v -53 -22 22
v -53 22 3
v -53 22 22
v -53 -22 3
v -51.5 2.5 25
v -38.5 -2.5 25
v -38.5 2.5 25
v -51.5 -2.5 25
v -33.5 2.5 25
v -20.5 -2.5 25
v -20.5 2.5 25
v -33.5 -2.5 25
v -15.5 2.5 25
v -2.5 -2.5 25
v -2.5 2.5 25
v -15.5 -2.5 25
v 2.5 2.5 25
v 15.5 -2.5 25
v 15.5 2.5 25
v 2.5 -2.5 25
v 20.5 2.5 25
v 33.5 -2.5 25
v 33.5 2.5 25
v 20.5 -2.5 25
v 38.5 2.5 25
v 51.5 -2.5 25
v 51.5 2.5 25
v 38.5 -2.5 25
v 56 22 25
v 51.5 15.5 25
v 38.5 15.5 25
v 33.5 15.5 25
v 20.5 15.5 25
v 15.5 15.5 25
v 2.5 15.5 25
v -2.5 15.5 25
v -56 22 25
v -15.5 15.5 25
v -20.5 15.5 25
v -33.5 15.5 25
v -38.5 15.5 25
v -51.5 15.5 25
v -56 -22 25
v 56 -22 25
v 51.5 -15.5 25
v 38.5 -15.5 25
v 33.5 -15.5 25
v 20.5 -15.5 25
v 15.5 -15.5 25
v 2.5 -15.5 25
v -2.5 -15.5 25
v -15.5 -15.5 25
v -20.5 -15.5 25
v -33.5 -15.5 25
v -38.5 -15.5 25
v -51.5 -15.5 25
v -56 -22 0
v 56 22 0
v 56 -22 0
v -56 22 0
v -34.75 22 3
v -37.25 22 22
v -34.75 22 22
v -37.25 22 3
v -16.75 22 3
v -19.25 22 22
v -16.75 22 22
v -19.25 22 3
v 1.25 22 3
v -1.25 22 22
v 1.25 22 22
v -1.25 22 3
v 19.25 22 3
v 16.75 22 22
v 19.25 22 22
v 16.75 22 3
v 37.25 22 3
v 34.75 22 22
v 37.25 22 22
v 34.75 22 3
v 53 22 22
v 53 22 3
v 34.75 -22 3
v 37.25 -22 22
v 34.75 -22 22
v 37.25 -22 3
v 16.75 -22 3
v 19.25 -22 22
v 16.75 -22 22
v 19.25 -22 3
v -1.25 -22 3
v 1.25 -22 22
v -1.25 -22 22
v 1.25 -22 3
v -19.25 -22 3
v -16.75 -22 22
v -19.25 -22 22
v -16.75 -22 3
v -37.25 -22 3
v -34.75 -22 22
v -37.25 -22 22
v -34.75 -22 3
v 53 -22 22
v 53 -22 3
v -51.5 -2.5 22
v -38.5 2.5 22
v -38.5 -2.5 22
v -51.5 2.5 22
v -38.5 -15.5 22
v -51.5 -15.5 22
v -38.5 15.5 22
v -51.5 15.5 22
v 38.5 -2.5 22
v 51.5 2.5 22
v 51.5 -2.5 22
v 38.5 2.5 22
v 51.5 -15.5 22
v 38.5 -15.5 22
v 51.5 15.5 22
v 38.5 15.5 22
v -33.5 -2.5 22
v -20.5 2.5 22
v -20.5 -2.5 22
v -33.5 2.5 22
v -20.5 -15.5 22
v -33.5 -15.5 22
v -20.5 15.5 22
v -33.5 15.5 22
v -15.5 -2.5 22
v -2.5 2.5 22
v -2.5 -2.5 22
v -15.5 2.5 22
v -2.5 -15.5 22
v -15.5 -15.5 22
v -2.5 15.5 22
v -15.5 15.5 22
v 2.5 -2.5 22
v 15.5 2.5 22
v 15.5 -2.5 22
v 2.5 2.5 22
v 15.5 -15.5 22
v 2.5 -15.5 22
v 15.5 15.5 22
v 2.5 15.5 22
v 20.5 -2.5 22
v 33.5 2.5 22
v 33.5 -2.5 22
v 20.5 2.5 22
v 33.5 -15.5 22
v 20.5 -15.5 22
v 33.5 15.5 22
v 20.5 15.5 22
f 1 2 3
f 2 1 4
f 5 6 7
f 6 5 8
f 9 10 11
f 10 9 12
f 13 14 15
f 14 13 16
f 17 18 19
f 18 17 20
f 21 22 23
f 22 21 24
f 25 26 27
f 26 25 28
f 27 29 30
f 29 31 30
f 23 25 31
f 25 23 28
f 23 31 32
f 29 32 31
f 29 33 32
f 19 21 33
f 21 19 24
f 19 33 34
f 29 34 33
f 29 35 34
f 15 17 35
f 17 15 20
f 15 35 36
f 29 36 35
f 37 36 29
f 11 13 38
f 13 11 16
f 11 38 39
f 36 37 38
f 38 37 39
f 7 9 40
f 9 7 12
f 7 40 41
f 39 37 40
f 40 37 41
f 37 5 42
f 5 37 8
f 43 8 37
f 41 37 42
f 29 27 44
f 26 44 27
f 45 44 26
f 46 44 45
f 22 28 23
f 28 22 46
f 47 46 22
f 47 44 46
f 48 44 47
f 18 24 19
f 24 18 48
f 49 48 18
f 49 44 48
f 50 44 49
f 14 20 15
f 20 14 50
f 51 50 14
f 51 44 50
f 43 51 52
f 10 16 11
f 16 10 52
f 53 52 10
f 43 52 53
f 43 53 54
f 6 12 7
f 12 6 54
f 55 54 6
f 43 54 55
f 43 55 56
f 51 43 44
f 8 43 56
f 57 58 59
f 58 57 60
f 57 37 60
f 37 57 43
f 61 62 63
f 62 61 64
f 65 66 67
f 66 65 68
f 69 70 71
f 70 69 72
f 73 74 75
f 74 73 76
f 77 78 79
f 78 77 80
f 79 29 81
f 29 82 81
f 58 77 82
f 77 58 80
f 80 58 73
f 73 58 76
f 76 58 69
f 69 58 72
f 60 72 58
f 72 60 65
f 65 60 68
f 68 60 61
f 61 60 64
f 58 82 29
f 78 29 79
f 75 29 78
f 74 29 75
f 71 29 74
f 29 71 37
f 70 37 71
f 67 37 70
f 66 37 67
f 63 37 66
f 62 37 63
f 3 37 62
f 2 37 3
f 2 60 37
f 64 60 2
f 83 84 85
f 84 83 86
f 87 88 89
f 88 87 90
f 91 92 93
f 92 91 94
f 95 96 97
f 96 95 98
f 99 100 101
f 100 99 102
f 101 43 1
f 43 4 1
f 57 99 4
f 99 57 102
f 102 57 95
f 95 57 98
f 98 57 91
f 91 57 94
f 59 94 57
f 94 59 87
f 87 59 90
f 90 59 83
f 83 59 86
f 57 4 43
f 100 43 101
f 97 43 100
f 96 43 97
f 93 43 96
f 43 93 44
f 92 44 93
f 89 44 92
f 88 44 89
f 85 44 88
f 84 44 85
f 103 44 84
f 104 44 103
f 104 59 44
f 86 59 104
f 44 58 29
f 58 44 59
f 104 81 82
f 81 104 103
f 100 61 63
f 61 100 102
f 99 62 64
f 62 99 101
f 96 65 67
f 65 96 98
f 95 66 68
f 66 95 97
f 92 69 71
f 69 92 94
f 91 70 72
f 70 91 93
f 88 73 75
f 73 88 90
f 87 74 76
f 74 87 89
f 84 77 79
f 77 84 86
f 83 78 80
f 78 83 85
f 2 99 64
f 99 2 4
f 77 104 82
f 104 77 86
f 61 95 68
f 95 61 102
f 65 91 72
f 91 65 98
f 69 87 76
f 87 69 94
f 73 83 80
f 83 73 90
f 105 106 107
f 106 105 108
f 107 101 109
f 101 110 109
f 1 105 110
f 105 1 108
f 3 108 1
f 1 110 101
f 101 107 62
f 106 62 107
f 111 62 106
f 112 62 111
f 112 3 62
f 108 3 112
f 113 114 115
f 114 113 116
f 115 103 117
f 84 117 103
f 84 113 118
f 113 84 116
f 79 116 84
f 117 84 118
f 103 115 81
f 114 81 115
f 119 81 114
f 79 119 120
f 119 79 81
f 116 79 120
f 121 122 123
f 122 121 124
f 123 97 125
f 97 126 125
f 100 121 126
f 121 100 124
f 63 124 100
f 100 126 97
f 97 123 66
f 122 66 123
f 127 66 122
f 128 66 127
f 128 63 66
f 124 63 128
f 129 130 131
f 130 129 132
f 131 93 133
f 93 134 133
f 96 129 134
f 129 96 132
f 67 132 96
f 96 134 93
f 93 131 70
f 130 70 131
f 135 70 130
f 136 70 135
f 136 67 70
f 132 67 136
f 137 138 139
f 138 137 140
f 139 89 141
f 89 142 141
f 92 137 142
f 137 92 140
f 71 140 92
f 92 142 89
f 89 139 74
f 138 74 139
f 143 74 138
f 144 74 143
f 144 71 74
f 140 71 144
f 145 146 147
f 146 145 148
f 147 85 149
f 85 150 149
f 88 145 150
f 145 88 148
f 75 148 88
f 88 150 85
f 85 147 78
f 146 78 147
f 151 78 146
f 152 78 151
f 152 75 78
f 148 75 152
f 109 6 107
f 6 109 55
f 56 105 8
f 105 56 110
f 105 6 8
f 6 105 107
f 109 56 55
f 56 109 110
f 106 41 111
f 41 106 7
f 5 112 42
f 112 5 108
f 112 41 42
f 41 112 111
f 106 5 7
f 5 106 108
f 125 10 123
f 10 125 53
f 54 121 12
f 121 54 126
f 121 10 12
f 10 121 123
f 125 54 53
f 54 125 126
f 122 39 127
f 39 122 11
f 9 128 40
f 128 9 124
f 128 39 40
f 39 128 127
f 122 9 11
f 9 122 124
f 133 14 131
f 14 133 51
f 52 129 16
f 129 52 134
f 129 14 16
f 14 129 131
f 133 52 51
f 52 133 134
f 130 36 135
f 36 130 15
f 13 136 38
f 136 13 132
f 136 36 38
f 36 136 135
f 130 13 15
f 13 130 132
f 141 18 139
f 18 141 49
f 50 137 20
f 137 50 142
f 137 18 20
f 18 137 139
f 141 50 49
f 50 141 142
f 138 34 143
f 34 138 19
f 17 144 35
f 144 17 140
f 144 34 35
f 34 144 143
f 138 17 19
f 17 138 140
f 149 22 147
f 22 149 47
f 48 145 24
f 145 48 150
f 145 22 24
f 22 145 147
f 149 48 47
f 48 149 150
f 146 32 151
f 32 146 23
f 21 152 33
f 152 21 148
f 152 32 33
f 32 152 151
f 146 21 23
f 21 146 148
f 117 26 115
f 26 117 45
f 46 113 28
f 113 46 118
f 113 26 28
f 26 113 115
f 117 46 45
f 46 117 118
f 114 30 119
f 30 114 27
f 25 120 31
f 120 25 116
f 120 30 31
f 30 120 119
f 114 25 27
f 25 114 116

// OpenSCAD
// Open-sided rack for 12 standard 12.5 mm square cuvettes (2 rows of 6)
// Category: benchware. A base plate and a perforated deck joined by seven upright walls that run
// front to back; the long sides stay open, so the cuvettes can be seen and read in the rack.
// The deck bridges only 15.5 mm between walls, so it prints without supports.
// Print: PLA or PETG, base on the bed, 0.2 mm layers.
// SPDX-License-Identifier: CERN-OHL-P-2.0

/* [Rack] */
plate = [112, 44];        // X, Y of the base plate and the deck [mm]
base_t = 3;               // base plate z = 0 .. 3
deck_z = 22;              // deck from z = 22 ...
deck_t = 3;               // ... to z = 25
end_t = 3;                // end walls, flush with the short ends
rib_t = 2.5;              // inner ribs
rib_x = [-36, -18, 0, 18, 36];
cols = 6;                 // holes along X
rows = 2;                 // holes along Y
pitch = 18;               // centre-to-centre in X and Y
hole = 13;                // square hole for a 12.5 mm cuvette

/* [Hidden] */
eps = 0.01;
H = deck_z + deck_t;

difference() {
    union() {
        translate([-plate.x / 2, -plate.y / 2, 0]) cube([plate.x, plate.y, base_t]);
        translate([-plate.x / 2, -plate.y / 2, deck_z]) cube([plate.x, plate.y, deck_t]);
        for (s = [-1, 1])
            translate([s > 0 ? plate.x / 2 - end_t : -plate.x / 2, -plate.y / 2, 0]) cube([end_t, plate.y, H]);
        for (x = rib_x)
            translate([x - rib_t / 2, -plate.y / 2, 0]) cube([rib_t, plate.y, H]);
    }
    for (i = [0 : cols - 1], j = [0 : rows - 1])
        translate([(i - (cols - 1) / 2) * pitch - hole / 2, (j - (rows - 1) / 2) * pitch - hole / 2, deck_z - eps])
            cube([hole, hole, deck_t + 2 * eps]);
}
